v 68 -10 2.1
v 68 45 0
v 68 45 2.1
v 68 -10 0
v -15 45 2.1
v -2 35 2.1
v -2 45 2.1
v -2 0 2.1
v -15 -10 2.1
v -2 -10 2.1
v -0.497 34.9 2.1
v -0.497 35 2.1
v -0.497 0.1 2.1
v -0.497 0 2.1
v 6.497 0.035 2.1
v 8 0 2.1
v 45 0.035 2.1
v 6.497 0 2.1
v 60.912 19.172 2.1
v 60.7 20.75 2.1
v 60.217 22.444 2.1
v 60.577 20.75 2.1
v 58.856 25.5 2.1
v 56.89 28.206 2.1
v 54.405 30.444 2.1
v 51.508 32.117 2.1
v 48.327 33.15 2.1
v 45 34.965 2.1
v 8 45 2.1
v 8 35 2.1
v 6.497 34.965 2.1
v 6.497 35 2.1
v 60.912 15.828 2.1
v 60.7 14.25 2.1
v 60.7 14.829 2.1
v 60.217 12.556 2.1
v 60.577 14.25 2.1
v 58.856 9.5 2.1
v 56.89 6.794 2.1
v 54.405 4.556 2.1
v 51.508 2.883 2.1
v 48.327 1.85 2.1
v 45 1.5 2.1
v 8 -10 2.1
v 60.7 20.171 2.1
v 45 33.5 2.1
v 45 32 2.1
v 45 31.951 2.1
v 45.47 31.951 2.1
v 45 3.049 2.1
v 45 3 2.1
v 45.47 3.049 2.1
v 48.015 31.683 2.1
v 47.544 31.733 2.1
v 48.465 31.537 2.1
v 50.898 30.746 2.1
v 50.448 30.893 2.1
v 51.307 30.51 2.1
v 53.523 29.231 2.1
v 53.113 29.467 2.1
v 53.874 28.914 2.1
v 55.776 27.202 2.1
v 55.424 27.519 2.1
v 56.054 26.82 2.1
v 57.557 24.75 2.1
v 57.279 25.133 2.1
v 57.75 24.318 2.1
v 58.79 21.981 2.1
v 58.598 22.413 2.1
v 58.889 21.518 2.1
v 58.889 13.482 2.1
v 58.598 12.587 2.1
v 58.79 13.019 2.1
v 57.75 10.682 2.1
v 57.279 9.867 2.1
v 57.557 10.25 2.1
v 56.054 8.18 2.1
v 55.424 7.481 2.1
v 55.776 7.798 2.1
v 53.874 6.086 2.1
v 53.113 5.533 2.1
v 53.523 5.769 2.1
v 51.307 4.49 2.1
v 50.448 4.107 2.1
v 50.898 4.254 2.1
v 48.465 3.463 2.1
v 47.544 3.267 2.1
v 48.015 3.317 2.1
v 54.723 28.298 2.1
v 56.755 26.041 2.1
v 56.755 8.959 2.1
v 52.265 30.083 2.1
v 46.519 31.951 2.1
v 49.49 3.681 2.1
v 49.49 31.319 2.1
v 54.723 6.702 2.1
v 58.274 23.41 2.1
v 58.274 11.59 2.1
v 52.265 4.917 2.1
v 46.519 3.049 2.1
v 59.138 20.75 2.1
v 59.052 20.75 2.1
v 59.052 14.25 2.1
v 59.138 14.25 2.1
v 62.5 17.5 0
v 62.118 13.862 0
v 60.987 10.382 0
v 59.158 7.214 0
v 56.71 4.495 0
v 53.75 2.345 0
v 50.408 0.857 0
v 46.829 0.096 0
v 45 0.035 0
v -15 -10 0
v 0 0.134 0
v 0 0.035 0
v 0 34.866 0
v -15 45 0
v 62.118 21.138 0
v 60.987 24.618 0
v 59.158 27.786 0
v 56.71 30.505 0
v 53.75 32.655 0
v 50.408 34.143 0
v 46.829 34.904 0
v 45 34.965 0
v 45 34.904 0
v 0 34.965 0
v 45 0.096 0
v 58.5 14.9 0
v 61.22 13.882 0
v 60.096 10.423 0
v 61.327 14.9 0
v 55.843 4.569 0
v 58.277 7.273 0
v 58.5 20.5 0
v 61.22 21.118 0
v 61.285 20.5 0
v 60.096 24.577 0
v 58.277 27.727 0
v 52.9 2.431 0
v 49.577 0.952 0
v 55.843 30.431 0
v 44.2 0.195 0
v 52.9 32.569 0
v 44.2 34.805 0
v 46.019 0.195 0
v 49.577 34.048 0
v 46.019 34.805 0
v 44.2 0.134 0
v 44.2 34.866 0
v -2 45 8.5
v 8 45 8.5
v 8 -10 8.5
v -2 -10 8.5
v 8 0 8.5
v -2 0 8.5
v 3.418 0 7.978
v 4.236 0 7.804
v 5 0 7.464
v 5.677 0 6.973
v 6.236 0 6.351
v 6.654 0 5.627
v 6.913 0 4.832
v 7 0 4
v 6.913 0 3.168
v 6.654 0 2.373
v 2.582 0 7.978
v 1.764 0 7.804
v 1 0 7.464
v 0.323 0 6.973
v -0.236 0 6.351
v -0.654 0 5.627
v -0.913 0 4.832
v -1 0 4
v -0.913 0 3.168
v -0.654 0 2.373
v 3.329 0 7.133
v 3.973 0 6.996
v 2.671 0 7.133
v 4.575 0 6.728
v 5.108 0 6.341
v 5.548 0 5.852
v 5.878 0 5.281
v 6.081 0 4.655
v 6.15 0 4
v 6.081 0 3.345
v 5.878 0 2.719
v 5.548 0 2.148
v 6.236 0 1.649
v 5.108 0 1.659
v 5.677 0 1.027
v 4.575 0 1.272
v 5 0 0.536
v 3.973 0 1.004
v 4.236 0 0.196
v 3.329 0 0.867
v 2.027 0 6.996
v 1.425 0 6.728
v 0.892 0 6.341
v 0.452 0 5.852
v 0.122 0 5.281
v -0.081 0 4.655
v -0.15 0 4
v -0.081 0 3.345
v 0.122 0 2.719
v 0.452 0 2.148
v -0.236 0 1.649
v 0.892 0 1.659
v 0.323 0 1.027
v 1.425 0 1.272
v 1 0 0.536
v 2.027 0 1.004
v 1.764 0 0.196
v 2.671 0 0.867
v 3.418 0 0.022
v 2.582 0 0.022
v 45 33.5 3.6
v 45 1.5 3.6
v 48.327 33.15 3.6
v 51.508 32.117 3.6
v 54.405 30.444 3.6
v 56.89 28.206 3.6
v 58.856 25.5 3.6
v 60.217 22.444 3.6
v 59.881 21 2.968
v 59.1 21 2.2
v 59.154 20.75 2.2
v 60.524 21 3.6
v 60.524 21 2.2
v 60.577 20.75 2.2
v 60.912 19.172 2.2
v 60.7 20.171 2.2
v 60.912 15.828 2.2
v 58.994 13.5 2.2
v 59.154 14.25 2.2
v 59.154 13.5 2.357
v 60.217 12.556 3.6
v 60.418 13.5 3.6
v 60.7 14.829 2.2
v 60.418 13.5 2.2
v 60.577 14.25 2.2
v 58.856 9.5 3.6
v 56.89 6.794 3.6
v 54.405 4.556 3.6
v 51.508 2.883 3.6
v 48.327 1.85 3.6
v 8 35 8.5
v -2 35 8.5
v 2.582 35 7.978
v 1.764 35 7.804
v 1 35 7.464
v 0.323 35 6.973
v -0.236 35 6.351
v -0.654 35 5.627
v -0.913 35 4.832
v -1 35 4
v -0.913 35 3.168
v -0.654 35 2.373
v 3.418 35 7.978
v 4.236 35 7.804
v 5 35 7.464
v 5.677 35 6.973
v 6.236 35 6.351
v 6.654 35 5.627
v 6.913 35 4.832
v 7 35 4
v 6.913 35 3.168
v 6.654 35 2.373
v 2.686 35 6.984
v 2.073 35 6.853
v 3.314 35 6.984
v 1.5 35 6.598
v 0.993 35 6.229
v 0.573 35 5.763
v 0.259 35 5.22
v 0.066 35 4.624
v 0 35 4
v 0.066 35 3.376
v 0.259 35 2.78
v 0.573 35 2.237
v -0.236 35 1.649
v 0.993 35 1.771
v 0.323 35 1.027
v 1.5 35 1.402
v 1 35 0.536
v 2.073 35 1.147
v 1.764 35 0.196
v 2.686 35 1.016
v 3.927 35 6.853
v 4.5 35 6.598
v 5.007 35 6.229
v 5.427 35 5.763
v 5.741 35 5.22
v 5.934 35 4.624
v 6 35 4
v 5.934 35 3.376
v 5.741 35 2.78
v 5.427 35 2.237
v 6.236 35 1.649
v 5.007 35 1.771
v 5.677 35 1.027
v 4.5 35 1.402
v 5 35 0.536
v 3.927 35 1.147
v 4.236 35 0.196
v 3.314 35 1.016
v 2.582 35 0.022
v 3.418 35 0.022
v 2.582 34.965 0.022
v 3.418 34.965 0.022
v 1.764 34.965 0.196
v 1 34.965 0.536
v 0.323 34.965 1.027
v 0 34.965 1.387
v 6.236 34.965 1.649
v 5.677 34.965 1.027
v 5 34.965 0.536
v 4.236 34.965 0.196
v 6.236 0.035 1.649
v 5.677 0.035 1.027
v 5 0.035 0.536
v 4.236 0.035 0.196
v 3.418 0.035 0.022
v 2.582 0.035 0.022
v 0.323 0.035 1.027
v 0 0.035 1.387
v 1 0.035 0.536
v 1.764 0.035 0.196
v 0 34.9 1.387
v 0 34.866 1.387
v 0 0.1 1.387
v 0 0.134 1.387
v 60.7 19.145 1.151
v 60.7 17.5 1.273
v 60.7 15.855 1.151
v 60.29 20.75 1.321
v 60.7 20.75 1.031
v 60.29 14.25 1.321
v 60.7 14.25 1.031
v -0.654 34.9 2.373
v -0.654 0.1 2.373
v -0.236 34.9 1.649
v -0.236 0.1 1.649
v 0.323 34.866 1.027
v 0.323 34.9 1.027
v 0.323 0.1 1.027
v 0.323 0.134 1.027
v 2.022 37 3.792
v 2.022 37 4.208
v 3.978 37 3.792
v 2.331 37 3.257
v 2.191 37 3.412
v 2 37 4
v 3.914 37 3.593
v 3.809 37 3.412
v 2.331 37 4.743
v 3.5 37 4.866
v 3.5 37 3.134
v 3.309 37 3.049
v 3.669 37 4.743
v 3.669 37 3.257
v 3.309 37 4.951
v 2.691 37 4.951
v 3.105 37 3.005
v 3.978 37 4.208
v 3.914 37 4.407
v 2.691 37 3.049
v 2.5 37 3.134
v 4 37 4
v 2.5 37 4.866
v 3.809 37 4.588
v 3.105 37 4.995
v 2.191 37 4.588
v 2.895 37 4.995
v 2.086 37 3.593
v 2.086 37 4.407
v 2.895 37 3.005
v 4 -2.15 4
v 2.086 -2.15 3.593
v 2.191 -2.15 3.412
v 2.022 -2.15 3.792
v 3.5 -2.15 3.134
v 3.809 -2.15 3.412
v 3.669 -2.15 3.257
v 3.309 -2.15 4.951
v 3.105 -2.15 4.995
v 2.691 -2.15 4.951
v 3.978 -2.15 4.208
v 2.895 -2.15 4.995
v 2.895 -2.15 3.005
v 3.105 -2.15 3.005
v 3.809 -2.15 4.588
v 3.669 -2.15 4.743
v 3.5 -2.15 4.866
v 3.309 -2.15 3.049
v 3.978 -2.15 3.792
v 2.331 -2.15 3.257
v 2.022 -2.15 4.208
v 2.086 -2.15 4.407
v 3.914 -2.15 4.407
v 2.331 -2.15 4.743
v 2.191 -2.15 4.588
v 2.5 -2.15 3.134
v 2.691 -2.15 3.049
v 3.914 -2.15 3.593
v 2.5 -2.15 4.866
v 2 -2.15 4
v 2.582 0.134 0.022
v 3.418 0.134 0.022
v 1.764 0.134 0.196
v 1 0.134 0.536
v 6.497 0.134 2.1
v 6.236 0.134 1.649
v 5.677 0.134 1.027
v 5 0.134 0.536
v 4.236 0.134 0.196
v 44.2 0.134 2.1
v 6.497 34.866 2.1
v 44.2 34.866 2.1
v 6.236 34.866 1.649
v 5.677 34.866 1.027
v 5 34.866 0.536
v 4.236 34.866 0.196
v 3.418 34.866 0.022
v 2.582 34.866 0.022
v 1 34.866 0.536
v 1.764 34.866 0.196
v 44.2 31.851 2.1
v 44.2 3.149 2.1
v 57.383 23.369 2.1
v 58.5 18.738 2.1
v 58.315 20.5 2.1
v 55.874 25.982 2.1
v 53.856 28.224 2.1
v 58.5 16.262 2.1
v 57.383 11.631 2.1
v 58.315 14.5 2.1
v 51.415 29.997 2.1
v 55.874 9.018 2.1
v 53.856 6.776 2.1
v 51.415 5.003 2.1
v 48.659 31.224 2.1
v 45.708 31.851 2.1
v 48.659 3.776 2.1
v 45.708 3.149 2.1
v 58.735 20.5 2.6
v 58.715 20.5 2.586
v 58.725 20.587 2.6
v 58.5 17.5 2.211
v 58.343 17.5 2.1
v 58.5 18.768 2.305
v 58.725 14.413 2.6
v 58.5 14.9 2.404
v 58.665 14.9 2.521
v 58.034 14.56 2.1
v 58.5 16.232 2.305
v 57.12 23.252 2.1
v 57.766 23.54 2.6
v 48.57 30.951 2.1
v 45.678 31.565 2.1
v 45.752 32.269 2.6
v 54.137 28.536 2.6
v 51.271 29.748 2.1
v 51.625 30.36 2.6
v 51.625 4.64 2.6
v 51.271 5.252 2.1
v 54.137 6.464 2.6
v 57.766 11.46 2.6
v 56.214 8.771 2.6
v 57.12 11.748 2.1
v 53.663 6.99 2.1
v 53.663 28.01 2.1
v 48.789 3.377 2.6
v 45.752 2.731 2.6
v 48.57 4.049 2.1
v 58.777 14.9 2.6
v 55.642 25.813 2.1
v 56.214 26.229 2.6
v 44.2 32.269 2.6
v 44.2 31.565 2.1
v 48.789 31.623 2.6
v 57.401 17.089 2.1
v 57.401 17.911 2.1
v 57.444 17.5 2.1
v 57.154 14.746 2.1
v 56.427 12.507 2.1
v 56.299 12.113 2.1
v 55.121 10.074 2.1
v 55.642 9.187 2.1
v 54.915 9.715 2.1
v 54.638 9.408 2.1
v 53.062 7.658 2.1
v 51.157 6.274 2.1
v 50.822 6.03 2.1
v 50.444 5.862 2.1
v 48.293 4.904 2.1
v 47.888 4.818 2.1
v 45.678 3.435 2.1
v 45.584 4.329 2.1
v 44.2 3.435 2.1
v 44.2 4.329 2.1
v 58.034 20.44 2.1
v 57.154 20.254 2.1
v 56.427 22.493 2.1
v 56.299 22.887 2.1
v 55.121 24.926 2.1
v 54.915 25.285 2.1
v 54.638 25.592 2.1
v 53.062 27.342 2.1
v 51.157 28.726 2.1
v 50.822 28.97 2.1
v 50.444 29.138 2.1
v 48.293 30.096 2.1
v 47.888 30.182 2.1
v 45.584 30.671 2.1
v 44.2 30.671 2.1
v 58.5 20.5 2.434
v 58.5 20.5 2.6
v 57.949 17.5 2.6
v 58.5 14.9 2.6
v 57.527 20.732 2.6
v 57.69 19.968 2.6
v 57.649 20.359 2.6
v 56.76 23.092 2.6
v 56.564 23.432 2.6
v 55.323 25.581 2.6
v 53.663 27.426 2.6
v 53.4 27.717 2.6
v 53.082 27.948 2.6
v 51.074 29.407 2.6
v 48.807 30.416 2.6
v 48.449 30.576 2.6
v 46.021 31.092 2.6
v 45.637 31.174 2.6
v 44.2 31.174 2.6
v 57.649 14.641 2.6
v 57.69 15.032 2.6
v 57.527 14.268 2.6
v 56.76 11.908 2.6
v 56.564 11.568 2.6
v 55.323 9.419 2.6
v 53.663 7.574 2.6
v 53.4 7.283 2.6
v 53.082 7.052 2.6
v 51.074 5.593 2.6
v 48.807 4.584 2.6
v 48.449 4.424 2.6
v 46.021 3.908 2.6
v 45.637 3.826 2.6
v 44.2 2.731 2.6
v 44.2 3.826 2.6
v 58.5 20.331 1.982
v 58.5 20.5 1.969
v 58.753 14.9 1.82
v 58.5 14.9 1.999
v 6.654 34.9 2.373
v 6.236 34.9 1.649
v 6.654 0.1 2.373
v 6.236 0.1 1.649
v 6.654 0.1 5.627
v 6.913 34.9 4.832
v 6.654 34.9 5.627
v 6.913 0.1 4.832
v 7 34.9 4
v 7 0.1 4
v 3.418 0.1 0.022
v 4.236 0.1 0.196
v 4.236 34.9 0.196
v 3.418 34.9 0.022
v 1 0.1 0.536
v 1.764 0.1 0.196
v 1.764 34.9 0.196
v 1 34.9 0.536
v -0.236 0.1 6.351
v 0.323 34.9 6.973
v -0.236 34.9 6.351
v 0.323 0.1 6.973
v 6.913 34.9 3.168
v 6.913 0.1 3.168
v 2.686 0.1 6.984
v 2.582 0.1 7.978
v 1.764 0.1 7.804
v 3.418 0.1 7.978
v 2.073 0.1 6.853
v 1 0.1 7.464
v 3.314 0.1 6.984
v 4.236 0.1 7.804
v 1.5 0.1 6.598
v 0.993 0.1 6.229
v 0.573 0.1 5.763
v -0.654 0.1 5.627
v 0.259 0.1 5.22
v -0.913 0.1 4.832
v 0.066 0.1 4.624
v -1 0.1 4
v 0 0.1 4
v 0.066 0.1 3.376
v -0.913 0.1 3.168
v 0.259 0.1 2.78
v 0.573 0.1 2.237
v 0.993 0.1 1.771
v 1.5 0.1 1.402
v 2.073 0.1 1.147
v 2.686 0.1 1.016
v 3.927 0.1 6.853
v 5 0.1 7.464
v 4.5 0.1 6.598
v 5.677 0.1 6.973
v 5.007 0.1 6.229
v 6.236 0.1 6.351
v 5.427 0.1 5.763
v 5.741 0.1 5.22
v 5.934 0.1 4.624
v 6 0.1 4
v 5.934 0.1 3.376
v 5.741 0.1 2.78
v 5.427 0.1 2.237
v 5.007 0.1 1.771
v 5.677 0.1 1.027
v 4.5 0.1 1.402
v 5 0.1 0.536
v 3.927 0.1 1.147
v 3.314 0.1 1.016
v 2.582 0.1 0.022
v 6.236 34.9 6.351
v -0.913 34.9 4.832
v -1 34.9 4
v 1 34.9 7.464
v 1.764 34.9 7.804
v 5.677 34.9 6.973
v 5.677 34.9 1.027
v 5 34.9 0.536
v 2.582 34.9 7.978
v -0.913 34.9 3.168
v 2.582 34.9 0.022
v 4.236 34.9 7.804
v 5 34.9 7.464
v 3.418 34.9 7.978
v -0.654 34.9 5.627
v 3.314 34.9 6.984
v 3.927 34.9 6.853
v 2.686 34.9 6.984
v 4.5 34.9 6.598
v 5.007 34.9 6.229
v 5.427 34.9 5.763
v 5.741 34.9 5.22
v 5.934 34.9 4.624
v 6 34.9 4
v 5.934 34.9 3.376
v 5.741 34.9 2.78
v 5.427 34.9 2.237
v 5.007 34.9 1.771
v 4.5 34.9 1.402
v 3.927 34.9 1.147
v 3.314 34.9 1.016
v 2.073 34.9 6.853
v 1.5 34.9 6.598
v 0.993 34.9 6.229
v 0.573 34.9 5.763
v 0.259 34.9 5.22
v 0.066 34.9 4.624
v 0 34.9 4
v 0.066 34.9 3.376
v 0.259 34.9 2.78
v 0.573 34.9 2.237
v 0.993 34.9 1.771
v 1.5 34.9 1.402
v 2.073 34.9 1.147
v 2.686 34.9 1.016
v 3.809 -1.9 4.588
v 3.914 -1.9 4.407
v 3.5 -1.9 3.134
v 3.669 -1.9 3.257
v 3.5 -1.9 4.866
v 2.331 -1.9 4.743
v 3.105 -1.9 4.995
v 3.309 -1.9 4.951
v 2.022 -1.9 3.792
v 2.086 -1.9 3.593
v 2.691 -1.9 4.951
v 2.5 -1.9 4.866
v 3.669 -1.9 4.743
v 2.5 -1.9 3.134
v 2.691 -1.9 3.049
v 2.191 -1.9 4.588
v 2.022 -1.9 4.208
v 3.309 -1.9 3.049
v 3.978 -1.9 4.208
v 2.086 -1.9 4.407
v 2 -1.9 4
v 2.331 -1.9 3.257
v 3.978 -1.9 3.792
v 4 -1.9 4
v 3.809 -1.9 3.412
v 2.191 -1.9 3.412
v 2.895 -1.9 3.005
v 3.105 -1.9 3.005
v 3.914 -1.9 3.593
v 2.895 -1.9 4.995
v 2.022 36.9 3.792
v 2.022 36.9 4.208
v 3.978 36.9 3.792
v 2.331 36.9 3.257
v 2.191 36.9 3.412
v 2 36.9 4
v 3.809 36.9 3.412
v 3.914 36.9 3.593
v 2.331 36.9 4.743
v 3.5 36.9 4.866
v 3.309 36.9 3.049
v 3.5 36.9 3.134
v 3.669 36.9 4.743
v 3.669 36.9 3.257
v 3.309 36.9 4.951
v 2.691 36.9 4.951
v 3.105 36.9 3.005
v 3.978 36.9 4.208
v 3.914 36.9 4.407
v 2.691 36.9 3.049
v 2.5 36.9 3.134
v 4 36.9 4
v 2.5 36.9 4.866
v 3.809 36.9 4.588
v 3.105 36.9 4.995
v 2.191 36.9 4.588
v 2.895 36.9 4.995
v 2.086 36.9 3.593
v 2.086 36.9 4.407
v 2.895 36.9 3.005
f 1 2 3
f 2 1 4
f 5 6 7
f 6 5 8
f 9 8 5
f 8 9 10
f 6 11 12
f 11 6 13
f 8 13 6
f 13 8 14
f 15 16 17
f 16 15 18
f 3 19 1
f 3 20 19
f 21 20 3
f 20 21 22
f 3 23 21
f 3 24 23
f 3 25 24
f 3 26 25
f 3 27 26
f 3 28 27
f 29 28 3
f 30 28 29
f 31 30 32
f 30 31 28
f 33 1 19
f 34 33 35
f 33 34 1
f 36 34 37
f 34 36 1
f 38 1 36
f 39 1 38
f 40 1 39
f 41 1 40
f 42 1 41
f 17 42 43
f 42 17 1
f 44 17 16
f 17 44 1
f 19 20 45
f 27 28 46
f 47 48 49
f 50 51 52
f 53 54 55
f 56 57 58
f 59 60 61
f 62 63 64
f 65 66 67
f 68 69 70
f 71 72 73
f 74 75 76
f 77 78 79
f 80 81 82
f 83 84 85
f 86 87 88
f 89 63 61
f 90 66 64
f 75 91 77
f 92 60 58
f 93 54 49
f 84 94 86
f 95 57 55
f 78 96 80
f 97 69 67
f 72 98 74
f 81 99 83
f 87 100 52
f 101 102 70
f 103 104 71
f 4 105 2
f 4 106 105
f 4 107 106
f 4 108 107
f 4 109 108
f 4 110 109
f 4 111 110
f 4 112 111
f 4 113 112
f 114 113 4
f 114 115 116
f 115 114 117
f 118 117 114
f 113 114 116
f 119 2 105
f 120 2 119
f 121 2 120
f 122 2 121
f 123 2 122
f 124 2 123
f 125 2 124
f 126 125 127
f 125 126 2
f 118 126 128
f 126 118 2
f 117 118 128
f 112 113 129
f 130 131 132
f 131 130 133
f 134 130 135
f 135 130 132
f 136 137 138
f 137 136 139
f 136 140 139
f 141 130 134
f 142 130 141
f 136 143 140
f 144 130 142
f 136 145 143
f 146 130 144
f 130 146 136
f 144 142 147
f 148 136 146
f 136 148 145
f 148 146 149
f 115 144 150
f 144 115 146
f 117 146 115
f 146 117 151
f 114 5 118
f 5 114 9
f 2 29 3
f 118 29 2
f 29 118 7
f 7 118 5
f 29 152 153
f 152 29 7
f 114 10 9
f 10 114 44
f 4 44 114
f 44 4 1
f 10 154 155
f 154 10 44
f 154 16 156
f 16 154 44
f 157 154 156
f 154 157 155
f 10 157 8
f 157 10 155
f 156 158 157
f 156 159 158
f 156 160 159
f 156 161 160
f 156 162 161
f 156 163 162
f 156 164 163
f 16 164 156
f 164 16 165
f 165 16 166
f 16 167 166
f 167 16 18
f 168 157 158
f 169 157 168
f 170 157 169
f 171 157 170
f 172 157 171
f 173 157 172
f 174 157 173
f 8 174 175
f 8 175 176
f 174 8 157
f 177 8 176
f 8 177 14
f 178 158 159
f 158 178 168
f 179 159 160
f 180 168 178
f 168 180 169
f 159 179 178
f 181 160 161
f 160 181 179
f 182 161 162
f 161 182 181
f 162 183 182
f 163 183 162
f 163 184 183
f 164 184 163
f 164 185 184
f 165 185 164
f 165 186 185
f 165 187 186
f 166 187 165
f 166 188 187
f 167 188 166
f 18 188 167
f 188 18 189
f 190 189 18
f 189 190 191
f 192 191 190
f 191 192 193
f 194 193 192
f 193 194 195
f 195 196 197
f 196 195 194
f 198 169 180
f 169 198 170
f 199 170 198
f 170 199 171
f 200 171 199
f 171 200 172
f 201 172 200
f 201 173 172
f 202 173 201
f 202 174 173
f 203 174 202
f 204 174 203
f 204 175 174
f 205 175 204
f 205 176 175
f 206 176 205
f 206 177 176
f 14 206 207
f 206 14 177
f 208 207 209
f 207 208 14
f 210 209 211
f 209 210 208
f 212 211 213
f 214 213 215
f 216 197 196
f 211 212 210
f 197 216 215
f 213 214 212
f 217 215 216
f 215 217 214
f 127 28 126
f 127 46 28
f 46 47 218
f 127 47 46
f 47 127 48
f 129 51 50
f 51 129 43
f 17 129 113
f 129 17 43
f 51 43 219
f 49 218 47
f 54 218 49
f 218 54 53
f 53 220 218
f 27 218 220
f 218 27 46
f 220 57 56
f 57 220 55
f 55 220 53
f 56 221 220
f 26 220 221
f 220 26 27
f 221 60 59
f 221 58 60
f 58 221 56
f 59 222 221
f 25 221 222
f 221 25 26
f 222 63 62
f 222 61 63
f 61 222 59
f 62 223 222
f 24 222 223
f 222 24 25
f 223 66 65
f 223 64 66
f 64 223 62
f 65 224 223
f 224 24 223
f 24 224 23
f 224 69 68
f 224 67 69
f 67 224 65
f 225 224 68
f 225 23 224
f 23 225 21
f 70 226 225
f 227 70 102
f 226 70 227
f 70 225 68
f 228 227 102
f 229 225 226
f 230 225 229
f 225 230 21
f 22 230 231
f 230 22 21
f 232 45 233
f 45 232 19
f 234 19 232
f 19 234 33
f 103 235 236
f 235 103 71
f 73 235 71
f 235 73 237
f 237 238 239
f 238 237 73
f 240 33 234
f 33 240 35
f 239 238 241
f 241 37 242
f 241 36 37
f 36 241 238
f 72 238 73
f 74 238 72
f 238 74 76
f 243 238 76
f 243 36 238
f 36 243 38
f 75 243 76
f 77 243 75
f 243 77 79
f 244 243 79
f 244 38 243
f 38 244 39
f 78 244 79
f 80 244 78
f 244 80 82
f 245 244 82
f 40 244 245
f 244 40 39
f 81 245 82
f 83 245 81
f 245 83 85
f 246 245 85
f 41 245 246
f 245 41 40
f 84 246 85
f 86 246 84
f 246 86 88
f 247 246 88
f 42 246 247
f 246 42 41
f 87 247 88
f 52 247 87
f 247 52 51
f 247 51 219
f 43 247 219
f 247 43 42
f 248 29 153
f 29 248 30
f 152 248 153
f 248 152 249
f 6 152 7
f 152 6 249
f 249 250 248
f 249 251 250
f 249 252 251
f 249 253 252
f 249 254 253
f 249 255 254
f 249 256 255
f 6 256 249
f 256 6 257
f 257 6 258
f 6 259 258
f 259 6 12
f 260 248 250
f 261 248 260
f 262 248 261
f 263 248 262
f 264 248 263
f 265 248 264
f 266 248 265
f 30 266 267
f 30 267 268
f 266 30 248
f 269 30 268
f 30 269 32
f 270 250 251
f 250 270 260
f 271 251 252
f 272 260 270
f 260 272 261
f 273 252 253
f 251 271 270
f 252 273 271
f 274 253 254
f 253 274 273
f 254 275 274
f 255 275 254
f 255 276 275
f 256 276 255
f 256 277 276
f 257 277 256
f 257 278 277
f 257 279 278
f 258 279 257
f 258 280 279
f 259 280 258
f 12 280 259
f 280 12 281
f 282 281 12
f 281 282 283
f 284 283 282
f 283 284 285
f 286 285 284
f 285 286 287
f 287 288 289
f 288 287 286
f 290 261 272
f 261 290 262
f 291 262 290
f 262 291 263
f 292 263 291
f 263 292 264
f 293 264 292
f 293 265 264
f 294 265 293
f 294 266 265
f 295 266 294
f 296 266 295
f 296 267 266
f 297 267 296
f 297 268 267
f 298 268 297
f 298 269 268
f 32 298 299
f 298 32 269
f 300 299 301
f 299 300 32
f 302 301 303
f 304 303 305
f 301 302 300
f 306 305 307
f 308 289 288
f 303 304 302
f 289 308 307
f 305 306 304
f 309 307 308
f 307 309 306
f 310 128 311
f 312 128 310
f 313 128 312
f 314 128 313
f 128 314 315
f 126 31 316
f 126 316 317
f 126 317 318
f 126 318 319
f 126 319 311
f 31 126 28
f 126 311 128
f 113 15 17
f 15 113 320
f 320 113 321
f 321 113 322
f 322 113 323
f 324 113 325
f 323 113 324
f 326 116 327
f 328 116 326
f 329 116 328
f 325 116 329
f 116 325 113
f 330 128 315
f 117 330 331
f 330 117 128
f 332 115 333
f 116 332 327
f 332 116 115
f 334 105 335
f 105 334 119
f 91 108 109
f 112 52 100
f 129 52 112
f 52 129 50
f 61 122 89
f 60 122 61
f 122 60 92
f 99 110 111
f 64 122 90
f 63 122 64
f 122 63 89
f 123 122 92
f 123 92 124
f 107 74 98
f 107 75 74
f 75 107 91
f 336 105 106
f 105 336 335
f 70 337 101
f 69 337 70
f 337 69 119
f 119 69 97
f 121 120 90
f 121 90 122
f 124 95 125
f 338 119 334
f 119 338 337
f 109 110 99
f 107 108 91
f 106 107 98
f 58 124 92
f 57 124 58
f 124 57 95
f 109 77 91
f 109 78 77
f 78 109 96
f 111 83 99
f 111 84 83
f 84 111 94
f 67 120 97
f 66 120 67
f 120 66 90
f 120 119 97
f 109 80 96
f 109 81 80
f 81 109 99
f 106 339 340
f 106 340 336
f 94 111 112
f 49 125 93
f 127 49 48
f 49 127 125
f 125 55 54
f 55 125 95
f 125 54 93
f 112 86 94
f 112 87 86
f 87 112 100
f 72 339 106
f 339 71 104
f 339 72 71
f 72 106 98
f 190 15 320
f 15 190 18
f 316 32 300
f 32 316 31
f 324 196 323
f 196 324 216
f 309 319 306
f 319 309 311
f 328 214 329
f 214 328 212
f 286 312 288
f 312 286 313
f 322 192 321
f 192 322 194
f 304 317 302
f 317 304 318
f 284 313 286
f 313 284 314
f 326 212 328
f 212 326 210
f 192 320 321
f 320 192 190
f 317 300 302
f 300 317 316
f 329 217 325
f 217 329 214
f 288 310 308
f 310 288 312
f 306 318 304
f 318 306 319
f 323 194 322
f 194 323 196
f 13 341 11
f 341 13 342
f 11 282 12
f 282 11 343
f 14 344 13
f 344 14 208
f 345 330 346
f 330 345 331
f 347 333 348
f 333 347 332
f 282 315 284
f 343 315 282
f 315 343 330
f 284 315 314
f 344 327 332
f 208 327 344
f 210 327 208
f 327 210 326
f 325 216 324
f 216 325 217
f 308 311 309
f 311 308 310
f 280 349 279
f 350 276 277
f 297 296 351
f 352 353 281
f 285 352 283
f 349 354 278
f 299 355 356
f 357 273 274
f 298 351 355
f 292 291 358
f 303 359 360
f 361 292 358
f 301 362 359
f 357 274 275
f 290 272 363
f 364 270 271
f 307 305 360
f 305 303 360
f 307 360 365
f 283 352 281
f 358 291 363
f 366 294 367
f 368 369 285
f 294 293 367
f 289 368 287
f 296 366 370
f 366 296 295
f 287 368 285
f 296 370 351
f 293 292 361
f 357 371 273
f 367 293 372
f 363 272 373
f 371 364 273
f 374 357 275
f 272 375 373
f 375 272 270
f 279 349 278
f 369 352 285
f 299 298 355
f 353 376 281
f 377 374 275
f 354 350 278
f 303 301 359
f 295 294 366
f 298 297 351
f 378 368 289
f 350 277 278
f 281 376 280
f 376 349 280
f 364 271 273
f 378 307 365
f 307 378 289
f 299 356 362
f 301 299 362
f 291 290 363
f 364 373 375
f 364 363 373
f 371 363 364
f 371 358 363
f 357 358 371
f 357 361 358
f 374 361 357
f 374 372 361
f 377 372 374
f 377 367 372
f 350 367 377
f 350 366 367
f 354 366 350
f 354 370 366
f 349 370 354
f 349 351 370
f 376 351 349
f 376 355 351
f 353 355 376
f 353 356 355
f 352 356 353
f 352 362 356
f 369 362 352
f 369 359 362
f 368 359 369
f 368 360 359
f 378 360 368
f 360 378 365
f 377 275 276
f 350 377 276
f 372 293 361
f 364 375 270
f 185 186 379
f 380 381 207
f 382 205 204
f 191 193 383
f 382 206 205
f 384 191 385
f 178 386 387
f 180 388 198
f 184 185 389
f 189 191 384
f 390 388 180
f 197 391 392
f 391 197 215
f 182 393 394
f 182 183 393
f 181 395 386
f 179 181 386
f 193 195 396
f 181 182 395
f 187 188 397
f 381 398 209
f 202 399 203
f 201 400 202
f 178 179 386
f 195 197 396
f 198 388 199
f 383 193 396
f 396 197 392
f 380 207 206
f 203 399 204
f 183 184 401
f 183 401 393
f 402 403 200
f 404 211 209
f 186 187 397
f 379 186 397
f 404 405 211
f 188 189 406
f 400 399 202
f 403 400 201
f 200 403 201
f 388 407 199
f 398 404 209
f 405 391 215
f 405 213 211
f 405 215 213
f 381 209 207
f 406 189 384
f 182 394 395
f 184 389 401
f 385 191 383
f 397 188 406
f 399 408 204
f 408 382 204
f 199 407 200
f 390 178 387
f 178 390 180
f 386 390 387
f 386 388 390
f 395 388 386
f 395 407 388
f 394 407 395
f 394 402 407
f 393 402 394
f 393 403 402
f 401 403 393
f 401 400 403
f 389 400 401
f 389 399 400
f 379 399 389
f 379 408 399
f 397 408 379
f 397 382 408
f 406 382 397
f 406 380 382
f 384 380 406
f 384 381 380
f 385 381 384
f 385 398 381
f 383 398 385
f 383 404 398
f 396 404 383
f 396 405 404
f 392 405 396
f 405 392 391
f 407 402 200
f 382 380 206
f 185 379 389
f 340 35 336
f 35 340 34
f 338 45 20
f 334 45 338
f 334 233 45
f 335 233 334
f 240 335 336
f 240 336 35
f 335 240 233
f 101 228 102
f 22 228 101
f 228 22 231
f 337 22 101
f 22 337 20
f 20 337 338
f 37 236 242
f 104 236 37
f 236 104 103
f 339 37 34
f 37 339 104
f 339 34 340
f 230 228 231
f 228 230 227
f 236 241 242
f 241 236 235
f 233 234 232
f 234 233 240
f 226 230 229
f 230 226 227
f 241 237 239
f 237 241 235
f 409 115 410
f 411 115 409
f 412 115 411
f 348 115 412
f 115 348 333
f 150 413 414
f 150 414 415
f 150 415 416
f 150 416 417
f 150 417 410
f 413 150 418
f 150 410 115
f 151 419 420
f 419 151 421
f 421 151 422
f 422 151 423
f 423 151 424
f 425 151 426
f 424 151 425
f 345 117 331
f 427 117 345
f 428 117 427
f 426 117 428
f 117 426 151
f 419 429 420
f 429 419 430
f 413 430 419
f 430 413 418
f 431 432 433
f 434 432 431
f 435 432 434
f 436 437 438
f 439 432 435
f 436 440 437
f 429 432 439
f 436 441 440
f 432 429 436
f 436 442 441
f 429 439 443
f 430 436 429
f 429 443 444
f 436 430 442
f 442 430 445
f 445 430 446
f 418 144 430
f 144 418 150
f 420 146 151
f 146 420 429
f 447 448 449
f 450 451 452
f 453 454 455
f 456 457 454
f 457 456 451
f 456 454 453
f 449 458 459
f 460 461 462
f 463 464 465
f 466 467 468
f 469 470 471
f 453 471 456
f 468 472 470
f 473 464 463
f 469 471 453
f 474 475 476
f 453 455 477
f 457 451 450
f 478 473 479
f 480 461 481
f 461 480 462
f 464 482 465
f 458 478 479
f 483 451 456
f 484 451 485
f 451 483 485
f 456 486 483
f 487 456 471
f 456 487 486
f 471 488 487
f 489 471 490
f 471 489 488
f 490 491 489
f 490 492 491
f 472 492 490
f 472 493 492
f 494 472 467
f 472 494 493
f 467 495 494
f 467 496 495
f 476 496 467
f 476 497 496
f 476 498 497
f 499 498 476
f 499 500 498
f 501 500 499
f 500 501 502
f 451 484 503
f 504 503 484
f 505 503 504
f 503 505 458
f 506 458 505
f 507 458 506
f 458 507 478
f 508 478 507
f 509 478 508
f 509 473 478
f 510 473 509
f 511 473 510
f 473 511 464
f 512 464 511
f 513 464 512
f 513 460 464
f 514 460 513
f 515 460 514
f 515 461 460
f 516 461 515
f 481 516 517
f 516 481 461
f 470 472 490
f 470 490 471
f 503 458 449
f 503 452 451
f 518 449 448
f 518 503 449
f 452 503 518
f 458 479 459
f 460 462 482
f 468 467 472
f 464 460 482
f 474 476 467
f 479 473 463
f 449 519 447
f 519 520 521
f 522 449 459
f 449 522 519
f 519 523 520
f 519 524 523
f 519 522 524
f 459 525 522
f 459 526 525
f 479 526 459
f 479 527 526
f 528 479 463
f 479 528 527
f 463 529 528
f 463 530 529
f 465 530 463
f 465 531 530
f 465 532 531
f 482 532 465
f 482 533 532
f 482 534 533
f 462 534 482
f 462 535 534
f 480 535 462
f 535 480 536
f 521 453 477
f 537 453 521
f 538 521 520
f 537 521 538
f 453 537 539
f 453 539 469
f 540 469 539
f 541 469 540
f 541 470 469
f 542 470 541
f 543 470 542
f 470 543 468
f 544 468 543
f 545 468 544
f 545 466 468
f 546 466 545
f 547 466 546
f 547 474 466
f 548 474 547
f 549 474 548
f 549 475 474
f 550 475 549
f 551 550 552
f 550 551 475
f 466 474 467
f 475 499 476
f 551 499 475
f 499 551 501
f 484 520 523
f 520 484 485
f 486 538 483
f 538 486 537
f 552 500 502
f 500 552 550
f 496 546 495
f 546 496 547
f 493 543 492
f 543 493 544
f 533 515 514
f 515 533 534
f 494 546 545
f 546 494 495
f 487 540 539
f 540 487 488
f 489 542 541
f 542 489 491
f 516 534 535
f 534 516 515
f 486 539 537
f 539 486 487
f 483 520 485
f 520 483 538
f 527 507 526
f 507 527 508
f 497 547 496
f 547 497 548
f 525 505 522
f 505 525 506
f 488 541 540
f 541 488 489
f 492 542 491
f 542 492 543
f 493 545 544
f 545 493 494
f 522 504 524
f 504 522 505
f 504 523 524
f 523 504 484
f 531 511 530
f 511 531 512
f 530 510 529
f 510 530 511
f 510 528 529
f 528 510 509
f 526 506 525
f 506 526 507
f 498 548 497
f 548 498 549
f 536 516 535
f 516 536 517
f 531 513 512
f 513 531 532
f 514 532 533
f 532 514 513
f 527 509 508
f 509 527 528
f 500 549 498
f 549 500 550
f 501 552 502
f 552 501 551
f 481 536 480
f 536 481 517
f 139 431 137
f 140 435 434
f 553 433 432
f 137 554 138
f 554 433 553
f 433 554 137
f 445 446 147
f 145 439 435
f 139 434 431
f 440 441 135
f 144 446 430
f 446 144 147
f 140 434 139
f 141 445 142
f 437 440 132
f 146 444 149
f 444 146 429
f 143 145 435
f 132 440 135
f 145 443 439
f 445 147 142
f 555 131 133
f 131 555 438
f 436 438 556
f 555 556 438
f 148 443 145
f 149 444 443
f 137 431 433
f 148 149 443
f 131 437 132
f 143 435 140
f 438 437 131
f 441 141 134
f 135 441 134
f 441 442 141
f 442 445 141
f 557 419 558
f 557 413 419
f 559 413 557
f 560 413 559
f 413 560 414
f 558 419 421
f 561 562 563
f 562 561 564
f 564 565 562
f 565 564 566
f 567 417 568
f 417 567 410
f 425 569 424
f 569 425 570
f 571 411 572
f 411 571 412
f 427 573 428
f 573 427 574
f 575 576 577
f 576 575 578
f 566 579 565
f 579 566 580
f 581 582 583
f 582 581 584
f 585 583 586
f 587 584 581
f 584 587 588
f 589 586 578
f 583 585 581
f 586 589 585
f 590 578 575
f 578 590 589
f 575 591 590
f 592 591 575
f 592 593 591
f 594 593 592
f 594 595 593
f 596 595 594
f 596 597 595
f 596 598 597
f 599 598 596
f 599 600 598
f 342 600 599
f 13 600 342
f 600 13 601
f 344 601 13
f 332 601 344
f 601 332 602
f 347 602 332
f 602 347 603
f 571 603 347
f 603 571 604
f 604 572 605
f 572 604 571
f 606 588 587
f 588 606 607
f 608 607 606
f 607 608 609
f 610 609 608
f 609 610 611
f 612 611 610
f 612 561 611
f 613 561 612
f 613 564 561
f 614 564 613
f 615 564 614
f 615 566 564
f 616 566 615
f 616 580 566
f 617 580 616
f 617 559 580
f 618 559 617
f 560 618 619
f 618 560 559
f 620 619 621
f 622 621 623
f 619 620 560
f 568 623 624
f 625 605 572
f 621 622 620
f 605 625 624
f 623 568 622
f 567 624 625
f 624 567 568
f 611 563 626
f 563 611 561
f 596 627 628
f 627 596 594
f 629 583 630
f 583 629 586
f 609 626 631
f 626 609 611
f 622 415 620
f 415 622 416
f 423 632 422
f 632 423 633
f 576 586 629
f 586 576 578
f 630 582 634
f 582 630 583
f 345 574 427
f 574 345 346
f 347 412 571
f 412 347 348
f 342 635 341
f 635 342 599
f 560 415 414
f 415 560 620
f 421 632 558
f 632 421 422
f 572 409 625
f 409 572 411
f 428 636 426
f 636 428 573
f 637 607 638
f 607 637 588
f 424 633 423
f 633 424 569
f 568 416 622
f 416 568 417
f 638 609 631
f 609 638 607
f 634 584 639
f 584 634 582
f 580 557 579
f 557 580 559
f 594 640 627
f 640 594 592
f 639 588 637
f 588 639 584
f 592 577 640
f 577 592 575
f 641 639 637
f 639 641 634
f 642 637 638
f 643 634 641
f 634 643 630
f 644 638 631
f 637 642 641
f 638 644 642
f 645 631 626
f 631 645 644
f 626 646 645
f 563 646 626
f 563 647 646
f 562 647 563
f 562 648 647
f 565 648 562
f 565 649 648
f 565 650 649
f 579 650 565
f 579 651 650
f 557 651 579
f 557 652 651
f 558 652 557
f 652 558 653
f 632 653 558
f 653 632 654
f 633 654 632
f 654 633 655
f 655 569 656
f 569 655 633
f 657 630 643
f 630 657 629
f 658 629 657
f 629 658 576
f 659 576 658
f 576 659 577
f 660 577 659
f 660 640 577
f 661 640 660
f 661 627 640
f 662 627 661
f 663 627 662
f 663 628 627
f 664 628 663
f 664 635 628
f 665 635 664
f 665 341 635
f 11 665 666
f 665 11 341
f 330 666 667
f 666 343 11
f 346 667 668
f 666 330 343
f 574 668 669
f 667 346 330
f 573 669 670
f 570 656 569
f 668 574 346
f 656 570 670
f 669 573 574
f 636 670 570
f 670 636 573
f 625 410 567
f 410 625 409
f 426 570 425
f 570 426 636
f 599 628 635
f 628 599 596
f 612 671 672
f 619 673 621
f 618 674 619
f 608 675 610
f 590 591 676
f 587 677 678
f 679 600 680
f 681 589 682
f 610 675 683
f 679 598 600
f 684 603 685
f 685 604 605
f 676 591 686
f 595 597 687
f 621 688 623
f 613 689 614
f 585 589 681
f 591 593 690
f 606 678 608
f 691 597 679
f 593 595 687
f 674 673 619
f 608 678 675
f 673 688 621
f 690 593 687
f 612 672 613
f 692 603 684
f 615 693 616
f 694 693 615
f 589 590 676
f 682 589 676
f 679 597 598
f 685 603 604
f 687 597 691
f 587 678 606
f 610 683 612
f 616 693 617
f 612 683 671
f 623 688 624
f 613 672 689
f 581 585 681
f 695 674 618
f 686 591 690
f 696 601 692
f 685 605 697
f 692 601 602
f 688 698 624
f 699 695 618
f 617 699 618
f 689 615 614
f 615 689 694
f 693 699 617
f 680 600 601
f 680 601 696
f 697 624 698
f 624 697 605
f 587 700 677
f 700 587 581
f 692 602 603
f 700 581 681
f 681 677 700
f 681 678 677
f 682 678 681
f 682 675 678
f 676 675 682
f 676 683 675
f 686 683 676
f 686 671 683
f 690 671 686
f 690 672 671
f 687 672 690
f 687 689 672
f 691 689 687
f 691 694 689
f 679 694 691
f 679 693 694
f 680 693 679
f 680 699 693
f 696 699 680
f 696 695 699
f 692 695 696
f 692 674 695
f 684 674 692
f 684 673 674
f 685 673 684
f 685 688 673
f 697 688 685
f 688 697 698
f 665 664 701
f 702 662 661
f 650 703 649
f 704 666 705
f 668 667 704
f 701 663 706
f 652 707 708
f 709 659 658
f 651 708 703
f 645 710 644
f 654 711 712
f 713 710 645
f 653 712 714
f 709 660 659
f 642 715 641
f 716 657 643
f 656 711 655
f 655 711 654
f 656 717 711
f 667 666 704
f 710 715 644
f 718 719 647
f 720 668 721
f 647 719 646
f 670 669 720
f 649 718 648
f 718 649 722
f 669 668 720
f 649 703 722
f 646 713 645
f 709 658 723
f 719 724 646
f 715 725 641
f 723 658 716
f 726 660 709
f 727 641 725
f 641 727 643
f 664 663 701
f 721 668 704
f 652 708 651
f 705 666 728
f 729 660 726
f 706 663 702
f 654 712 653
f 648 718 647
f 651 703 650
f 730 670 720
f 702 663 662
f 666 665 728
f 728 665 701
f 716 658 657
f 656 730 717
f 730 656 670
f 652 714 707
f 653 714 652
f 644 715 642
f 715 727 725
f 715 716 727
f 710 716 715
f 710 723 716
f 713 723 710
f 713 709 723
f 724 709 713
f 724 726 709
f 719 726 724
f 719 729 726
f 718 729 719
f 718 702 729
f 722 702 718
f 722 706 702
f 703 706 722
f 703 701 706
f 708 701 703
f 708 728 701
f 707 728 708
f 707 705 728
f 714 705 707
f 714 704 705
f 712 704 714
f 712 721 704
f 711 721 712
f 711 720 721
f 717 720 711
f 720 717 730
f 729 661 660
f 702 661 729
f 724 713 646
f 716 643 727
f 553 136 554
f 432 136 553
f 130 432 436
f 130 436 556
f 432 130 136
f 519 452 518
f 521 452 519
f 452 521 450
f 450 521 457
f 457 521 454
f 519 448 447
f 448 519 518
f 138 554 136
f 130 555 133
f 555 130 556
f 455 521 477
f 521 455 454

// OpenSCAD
// file: latch.scad
$fn = 50;
rotate_d = 15;
tip_lenght = 6;
thikness = 5;
width = 7;
height = 7;


// translate([-0.5,0,1.4])#sup_triangel();

module sup_triangel()
{
    h = 1;
points = [[(h),0],[-(h),0],[0,h]];
rotate([90,0,0])linear_extrude(10)polygon(points);
}
module locker()
{
    
    r1 = 7;
    
    cylinder(8,5,5);
    cylinder(3,1,r1);
    translate([0,0,5])mirror([0,0,1])cylinder(2,1,r1);
    translate([0,0,2])cylinder(h= 1, r = r1);
    translate([0,0,8.5])cube([2,9,2],true)
    
    ;}
    
    
    
    
    
    

    

    module the_tip(){
      {  difference(){
       translate([height-1,width/2+0.5,0.5])
       
       rotate([90,0,90]) linear_extrude(1)minkowski(){
       square([tip_lenght-1,thikness-1],false);
         
           
           
 //translate([height-1,(width/2)+tip_lenght,thikness/2])rotate([90,0,90])
            circle(r = 0.5);
        }
        
        
        translate([height-1-0.1,width/2-0.2,-0.1])rotate([90,0,90])linear_extrude(2)square([0.5+0.2,thikness+0.2]);
        }
       }}
       
    
       
   module latch(h = 10, width = width, thikness = thikness){
    union(){  
        
       translate([0,-width/2,0])cube([h,width,thikness]);
            cylinder(r =width/2,h = thikness);
       }
       }
       
       module lock_m(){
    difference(){
    union(){
       difference()
       {latch(height, width);
       translate([0,0,-0.1])latch(height*2,width-2.5,width+5);
           rotate([0,0,rotate_d])translate([0,-1,-1])cube([20,10,10]);
          translate([0,-1,-1]) cube([20,10,10]);
       }
       
       
       rotate([0,0,rotate_d])translate([3,1,0]){snap();}
       
       
       translate([0,-4,0])the_tip();
   
              rotate([0,0,rotate_d])translate([0,(width-1)/2-0.75,0])cube([height+0.5,1.25,thikness]);
       }
       translate([-1.9,0,8])rotate([90,0,-90])sup_triangel();
       }
       }
       
      // lock_m();
       
    translate([4.5,-2.5,-11.7])
       scale(1)translate([-4.5,2.5,11.7])rotate([90,90,0])lock_m();
 


 module snap(w = 5,h= height, t= thikness)
       {
           
           
           difference(){
       translate([height-5.5,(w/2)+2,t/2])rotate([0,0,0])cube([7.3,4,t],true);
    
               translate([height-3,w-(0.5),t/2])rotate([0,0,45])cube([5,8,t*2],true);
       
               translate([height-8,w-(0.5),t/2])rotate([0,0,45])cube([8,5,t*2],true);
             
           
     }
       
           
           }
       
// main file
$fs = 0.1;



use <latch.scad>


cover_length = 80;
cover_width = 35;
cover_thickness = 2.1;
Resolution = 50;
module round_hull(r,w)
{
    
$fn=Resolution;
hull()
{
    circle(r);
    translate([w,0,0,])circle(r);
    }    
    
    }
module drafted_pin(radius, hieght)
{
    

c1 = radius;
h = hieght;
c2 =(h < c1)? c1 - h : 0;

cylinder(h,c1,c2);    
    
    
    }
// s_cover(35,80,2);
 module s_cover(width,length,thickness){
    
     
     
     
     union(){ difference()
    {
    linear_extrude(thickness)round_hull(width/2,length-width);
   translate([width/4+(length-width),0,0])cube([width/2,width,10],true);
   translate([-width/4,0,0])cube([width/2,width,10],true);
   
     
        } 
        thickness2 = 0.5;
        width2 = 29.7;
       
            translate([(length-width),0,0]){
                cylinder(h=thickness,r1 = width/2, r2 =width/2-(sqrt(2)*thickness));
            translate([0,0,thickness2-thickness])difference(){
               
            translate([0,0,(thickness)*2+0])mirror([0,0,1])cylinder(h=thickness2,r1 = width2/2, r2 =width2/2-(sqrt(2)*thickness2));
            translate([0,0,(thickness)*2+0.1])mirror([0,0,1])cylinder(h=thickness2+0.2,r1 = width2/2-1, r2 =(width2/2-(sqrt(2)*thickness2)-1));
            translate([-50,-25,0])cube([50,50,5]);
            }
            
            }
        
        }
    }   
module cover(width,length,thickness)
    {
//width = 30;
//length = 60;
//thickness = 2;
        
module joint()
        {
            
        
 rotate([90,0,0])translate([3,4,0])drafted_pin(3,2);
        
            }
     
          
Resolution = 50;
            

 union(){union(){       
translate([0,width/2,0])  
    s_cover(width,length,thickness);
     

   rotate([90,0,0])translate([3,4,-width])cylinder(width,4,4);
  
        joint();
        
 }mirror([0,1,0])translate([0,-width,0]) joint();}
        
 
 }
        





 
 cover_unit();
module cover_unit(){
difference(){union(){
union()
{
translate([-15,-10,0]) cube([cover_length+3,cover_width+20,2.1]);
translate([-2,-10,2])cube([10,10,6.5]);    
 translate([45,17.5,3.6])rotate([0,180,-90])locking(w = 16, h = 1.5);

}
translate([0,cover_width,0])mirror([0,1,0]){
    translate([-2,-10,2])cube([10,10,6.5]);
    }
}



translate([0,30,0])mirror([0,1,0])rotate([90,0,0])translate([3,4,0])drafted_pin(3+0.15,2+0.15); 
rotate([90,0,0])translate([3,4,0])drafted_pin(3+0.15,2+0.15);



//scale([1,1,1.04])translate([0,0,-0.05])
color("green"){cover(cover_width,cover_length,cover_thickness);}



//color("red")translate([46.6,18,7])rotate([90,90,0])scale([1.05,1.05,1.05])lock_m();

    translate([cover_length-cover_width/2-2.8,cover_width/2,2]) cube([2,6.5,3],true);

//translate([3,15,-1])s_cover(cover_width,cover_length,cover_thickness+2);


       // translate([cover_length-cover_width/2-6.6+0.2,cover_width/2+3,6.2-0.75])    translate([4.5,-2.5,-11.7])
       //scale([1+tollerance,1.21,1+tollerance])translate([-4.5,2.5,11.7])rotate([90,90,0])lock_m();
translate([cover_length-cover_width/2-9.6+0.75,cover_width/2-4,2.2])cube([11-3.5,5+2.5,5]);
}


difference(){
translate([0,0.1,0])color("blue"){cover(cover_width-0.2,cover_length-1,cover_thickness);}
translate([cover_length-cover_width/2-4,cover_width/2-2.6,-1])cube([4,5+0.6,8]);
}



//width = 30-0.6;
//length = 50-0.6;
//thickness=2;




tollerance = 0.2;


}


module locking(w = 1, h = 1)
{
    points = [[0,0],[0,h],[h,h]];
    rotate_extrude(angle = 180)translate([w,0,0])mirror([1,0,0])polygon(points);

}
module cover_unit2(){
difference(){union(){
union()
{
translate([-15,-10,0]) cube([cover_length+3,cover_width+20,2.1]);
translate([-2,-10,2])cube([10,10,8]);    
}
translate([0,cover_width,0])mirror([0,1,0]){
    translate([-2,-10,2])cube([10,10,8]);
    }
}


/*
translate([0,30,0])mirror([0,1,0])rotate([90,0,0])translate([3,4,0])drafted_pin(3+0.15,2+0.15); 
rotate([90,0,0])translate([3,4,0])drafted_pin(3+0.15,2+0.15);

*/

//scale([1,1,1.04])translate([0,0,-0.05])
color("green"){cover(cover_width,cover_length,cover_thickness);}



//color("red")translate([46.6,18,7])rotate([90,90,0])scale([1.05,1.05,1.05])lock_m();

    translate([cover_length-cover_width/2-2.8,cover_width/2,2]) cube([2,6.5,3],true);

//translate([3,15,-1])s_cover(cover_width,cover_length,cover_thickness+2);


        translate([cover_length-cover_width/2-6.6+0.2,cover_width/2+3,6.2-0.75])    translate([4.5,-2.5,-11.7])
       scale([1+tollerance,1.21,1+tollerance])translate([-4.5,2.5,11.7])rotate([90,90,0])lock_m();

}


difference(){
translate([0,0.3,0])color("blue"){cover(cover_width-0.6,cover_length-1,cover_thickness);}
translate([cover_length-cover_width/2-9.6+0.75,cover_width/2-2.6,-1])cube([11,5+0.6,8]);
}



//width = 30-0.6;
//length = 50-0.6;
//thickness=2;


difference(){
color("red")translate([cover_length-cover_width/2-6.6,cover_width/2+2.7,7])rotate([90,90,0])lock_m();
 /*difference()
    {
        
 color("green"){cover(cover_width,cover_length,cover_thickness);}
        
 color("green")scale(0.99){cover(cover_width,cover_length,cover_thickness);}
        }*/
translate([-0.5,0,-0.2])translate([cover_length-cover_width/2,cover_width/2,cover_thickness])rotate([0,45,0])translate([1,0,0])cube([sqrt(2)*cover_thickness,cover_width+2,sqrt(2)*cover_thickness],true);
       
}

tollerance = 0.2;
difference(){
translate([cover_length-cover_width/2-1.8,cover_width/2-3.5,2])cube([3,7,3]);
    
        translate([cover_length-cover_width/2-6.6+0.2,cover_width/2+3,6.2-0.75])    translate([4.5,-2.5,-11.7])
       scale([1+tollerance,2,1+tollerance])translate([-4.5,2.5,11.7])rotate([90,90,0])lock_m();

    
    }

}
module cover2(width,length,thickness)
    {
//width = 30;
//length = 60;
//thickness = 2;
c_x = 3;
c_y = 3.2;
c_z = 0;
module joint()
        {
            
        
 rotate([90,0,0])translate([c_x,c_y,c_z])drafted_pin(1.5,1);
        
            }
     
          
Resolution = 50;
            

 union(){union(){       
translate([0,width/2,0])  
    s_cover(width,length,thickness);
     

   rotate([90,0,0])translate([c_x,c_y,-width])cylinder(width,1.5,1.5);
  
        joint();
        
 }mirror([0,1,0])translate([0,-width,0]) joint();}
        
 
 }
        
